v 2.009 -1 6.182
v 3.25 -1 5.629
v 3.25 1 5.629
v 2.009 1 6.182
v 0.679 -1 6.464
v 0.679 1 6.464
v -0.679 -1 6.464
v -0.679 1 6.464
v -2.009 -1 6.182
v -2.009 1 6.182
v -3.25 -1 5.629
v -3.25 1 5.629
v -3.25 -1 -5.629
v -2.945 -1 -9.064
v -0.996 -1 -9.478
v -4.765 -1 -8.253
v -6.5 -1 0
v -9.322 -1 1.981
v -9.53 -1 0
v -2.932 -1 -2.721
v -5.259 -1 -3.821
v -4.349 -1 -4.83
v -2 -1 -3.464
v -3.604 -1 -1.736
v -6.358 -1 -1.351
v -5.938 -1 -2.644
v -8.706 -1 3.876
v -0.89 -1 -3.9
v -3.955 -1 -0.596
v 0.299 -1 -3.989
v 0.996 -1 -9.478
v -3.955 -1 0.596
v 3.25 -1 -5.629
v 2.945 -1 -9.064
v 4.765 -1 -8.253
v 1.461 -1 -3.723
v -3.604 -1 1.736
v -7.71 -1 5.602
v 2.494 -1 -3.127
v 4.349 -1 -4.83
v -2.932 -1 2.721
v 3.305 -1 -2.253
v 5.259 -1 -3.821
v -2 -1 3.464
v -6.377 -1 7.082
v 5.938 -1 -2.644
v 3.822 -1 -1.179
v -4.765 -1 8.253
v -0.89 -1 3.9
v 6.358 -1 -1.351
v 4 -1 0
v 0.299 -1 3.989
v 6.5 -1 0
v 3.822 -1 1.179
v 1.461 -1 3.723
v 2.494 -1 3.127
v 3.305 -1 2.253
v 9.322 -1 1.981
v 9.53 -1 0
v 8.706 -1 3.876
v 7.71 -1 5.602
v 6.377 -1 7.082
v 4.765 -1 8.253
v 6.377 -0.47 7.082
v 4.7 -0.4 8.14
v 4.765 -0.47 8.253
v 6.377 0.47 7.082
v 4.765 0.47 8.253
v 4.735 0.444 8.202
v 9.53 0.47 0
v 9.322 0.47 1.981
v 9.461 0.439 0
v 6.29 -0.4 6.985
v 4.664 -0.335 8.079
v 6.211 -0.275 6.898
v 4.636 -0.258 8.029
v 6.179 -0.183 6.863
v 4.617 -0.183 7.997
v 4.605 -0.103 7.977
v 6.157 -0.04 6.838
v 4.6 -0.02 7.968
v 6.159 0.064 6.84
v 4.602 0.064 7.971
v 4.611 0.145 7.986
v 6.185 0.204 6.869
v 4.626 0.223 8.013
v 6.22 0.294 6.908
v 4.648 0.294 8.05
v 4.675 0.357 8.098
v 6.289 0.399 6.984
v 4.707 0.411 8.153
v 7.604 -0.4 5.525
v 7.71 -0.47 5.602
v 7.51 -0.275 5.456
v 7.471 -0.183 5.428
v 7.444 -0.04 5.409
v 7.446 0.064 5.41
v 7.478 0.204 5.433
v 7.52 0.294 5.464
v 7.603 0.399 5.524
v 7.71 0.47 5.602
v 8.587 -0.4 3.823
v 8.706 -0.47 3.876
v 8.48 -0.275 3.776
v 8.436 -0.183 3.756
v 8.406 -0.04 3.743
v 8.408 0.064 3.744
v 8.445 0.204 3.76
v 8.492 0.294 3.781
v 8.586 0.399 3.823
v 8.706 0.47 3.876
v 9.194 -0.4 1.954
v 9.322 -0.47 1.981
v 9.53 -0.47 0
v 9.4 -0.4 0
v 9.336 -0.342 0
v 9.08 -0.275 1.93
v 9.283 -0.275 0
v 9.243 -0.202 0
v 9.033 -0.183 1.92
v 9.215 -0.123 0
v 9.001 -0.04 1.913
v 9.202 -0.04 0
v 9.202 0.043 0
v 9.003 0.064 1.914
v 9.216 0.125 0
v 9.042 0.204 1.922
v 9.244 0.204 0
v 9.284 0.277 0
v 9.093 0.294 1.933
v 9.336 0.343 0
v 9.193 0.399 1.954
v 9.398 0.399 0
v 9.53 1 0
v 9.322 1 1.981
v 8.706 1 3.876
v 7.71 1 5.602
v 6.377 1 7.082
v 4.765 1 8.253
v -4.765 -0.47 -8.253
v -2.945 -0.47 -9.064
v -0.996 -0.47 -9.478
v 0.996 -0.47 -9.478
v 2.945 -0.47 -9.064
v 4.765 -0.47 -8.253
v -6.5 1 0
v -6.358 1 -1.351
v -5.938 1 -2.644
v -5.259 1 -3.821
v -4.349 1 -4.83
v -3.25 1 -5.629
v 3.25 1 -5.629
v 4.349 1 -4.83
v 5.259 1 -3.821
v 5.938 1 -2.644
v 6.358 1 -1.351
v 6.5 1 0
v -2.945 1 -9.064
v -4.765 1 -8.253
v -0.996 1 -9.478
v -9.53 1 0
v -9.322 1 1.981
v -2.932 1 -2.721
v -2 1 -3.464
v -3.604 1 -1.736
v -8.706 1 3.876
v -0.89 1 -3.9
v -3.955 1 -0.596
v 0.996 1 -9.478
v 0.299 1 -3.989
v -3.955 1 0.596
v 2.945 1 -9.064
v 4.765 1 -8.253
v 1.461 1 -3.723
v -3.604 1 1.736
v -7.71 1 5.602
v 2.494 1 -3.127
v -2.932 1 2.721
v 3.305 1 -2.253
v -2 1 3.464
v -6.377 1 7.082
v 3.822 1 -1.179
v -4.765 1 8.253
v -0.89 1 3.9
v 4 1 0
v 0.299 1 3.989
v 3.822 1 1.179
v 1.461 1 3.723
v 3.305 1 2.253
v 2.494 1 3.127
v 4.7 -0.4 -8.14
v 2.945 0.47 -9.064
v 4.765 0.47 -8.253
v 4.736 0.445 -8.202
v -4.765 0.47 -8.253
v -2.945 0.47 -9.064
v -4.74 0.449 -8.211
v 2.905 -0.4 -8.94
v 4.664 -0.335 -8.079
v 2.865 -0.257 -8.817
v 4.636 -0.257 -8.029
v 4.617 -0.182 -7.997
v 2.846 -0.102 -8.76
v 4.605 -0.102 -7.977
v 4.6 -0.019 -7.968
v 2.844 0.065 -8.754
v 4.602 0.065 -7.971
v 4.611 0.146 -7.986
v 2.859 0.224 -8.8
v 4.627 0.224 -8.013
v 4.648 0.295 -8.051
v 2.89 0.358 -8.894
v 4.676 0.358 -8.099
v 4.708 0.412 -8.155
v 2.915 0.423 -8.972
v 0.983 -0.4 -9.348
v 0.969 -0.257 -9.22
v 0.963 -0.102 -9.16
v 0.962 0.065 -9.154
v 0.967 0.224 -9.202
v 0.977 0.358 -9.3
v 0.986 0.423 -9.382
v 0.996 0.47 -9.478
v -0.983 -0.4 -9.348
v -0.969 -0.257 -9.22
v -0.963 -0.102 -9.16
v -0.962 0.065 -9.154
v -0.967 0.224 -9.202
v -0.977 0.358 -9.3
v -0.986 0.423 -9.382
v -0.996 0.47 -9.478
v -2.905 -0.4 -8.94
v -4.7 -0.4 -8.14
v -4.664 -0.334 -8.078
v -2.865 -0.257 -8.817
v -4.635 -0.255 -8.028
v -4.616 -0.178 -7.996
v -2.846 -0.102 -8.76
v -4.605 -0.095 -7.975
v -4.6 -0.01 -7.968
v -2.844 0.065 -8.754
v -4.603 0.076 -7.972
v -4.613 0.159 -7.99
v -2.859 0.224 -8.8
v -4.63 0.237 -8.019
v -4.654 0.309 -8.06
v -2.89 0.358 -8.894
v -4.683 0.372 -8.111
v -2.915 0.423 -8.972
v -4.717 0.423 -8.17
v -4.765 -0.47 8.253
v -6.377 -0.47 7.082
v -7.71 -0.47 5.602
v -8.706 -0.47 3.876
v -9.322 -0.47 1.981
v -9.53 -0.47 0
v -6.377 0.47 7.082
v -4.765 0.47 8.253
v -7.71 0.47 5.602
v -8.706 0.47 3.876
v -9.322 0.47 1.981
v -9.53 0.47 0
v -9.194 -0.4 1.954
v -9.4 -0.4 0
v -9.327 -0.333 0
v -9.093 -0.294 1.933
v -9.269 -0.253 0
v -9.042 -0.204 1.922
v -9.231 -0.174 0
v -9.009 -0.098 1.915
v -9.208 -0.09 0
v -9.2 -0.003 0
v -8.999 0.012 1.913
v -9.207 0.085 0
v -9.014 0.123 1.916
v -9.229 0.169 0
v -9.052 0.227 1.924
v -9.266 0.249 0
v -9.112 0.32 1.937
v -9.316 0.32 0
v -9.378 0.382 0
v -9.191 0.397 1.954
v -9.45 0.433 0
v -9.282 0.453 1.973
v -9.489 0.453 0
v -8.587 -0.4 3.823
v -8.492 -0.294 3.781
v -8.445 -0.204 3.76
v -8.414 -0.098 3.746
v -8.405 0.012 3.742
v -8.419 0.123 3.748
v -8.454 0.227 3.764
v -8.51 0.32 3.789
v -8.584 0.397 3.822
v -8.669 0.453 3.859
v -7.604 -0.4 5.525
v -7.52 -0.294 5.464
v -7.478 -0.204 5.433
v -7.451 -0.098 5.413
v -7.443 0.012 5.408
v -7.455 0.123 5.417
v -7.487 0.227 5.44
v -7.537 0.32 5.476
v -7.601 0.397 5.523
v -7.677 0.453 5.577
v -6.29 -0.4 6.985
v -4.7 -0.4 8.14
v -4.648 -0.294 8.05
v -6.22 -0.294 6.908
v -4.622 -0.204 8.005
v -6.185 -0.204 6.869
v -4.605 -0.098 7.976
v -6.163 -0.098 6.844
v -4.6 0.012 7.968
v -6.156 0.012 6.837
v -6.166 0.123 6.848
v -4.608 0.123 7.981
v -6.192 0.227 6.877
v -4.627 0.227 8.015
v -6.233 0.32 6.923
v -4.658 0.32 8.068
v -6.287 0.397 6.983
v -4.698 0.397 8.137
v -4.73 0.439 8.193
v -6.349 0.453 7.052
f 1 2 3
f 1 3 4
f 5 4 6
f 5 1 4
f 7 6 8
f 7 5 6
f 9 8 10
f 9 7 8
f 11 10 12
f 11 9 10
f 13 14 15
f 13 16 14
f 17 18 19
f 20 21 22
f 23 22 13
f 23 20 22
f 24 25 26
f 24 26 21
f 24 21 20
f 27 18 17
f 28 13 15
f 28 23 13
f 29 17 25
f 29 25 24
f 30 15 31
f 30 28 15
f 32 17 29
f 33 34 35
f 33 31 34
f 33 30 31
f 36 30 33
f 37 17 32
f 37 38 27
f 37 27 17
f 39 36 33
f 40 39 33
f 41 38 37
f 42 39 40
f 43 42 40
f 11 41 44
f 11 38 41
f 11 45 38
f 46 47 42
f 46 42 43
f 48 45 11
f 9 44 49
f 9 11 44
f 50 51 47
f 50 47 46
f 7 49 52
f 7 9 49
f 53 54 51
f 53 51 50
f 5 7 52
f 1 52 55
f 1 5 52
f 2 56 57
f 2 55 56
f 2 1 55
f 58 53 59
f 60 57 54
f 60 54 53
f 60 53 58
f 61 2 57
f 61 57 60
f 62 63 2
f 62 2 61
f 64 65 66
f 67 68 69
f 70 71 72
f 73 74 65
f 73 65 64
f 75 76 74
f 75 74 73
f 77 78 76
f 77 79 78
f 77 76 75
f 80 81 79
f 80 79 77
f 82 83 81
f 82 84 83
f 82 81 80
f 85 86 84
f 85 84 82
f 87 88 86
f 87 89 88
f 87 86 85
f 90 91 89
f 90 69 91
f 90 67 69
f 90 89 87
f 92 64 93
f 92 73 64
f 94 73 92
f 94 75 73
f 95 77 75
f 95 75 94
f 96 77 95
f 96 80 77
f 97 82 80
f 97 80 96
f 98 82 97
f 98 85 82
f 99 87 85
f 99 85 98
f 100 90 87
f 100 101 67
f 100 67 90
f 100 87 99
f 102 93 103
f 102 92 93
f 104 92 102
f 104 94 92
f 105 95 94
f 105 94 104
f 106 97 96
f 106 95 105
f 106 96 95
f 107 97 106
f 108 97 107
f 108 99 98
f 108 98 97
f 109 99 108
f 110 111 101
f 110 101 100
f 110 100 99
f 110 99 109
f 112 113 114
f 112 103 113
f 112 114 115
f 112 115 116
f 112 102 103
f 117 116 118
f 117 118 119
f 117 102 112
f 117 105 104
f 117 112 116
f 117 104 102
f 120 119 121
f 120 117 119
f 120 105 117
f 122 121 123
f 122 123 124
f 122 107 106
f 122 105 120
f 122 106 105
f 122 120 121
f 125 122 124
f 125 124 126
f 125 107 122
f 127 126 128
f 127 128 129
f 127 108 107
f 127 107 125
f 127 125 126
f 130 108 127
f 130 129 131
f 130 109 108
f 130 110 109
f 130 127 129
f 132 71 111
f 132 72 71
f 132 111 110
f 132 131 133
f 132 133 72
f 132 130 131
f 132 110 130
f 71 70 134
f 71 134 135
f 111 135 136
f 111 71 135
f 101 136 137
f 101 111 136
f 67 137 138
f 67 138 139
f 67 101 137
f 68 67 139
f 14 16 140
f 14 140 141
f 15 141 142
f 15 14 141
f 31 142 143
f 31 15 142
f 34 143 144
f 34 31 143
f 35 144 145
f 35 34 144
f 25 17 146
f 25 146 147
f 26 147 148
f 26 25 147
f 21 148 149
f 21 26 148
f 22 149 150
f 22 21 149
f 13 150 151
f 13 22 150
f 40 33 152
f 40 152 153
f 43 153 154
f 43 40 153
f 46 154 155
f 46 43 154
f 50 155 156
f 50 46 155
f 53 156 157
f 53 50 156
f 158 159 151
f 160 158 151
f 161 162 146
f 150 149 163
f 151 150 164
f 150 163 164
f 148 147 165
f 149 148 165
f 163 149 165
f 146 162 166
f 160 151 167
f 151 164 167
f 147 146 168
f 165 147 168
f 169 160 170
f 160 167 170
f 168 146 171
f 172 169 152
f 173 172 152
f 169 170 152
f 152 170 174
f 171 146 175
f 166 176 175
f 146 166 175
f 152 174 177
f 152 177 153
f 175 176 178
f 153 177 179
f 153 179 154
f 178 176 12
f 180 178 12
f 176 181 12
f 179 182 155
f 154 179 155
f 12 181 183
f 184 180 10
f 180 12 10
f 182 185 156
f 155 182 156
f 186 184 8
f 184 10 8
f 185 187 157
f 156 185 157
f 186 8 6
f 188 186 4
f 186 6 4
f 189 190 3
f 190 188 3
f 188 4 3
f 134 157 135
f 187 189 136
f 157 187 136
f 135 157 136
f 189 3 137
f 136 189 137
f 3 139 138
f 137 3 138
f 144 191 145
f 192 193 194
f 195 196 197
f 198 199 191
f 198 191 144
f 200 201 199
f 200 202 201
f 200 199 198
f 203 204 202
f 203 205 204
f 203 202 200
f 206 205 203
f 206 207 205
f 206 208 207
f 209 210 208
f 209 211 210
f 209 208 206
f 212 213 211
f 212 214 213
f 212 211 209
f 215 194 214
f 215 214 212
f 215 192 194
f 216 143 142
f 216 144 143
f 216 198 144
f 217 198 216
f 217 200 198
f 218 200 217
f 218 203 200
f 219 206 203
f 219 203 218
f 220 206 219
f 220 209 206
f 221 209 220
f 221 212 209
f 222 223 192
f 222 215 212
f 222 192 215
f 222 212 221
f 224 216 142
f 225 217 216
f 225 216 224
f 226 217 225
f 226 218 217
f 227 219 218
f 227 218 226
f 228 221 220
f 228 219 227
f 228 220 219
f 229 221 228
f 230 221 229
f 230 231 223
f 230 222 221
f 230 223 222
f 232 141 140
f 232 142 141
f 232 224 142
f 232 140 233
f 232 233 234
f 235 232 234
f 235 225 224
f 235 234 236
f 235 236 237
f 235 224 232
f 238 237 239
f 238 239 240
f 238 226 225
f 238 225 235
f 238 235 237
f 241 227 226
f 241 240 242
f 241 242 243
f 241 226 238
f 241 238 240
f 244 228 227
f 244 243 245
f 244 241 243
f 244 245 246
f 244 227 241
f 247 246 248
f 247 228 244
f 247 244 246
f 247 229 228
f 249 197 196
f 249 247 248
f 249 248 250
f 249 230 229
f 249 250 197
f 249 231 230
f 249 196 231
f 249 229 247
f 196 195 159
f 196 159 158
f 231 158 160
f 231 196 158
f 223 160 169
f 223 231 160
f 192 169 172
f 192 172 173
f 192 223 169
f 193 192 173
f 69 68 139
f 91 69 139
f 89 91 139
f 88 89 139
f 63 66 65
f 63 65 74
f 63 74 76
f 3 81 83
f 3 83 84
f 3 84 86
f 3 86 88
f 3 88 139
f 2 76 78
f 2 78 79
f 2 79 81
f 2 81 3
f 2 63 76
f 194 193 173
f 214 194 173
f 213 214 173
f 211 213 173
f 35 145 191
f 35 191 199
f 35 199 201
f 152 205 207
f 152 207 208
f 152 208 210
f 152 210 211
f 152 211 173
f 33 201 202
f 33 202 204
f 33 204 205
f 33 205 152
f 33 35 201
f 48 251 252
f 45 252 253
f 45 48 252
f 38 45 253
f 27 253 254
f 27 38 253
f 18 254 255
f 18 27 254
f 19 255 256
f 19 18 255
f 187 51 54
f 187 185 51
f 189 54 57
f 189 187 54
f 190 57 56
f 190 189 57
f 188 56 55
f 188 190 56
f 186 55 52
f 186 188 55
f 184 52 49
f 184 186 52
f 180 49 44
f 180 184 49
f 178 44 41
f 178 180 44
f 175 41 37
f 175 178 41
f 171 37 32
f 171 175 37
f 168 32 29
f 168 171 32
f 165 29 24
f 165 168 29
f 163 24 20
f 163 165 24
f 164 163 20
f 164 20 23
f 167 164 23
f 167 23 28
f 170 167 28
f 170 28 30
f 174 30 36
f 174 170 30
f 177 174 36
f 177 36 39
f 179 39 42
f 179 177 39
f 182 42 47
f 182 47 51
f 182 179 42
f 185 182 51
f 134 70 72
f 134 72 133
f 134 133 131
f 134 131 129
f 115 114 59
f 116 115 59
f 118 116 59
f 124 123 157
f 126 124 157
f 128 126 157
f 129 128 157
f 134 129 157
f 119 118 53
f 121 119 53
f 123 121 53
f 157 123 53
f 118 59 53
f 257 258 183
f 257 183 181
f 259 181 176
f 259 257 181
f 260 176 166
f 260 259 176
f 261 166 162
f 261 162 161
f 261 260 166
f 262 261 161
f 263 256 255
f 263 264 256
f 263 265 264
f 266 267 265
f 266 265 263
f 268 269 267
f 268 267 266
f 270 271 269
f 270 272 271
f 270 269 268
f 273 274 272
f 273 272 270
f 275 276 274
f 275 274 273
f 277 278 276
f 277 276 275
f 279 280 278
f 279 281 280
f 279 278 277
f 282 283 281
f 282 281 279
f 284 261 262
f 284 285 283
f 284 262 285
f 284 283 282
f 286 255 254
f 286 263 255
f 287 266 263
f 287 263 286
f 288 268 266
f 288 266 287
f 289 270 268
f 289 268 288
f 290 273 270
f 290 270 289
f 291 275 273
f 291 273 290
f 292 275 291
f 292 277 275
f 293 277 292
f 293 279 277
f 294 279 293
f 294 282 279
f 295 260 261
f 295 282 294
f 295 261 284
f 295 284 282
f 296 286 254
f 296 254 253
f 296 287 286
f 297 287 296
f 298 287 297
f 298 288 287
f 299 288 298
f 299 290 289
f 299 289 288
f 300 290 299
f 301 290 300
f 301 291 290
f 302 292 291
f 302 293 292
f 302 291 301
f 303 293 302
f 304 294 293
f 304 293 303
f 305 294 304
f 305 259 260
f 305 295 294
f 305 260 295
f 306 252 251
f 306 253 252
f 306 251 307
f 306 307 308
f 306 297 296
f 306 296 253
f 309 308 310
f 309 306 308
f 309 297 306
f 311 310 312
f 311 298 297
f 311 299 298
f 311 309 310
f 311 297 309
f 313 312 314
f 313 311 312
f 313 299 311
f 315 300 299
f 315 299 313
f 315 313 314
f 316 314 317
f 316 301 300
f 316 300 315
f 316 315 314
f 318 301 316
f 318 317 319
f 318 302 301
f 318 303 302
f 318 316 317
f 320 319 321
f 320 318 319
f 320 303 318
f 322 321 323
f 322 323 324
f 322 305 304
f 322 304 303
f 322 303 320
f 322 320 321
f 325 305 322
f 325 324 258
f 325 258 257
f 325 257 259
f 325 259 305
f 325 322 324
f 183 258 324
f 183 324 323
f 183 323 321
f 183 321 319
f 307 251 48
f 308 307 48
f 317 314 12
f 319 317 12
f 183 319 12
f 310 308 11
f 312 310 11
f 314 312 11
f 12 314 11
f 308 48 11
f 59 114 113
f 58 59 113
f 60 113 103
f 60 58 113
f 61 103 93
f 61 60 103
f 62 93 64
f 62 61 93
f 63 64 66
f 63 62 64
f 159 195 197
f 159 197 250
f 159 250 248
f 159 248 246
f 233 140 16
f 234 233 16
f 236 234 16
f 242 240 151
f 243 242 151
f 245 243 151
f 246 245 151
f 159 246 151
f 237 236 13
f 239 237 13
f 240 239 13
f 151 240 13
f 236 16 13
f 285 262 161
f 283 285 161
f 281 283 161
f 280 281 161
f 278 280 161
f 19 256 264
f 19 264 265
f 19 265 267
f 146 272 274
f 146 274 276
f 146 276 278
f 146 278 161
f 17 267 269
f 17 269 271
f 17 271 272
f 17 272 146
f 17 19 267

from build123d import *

# Parameters (mm, degrees)
SKETCH005_R          = 9.53
SKETCH005_R_2        = 4
PAD001_DEPTH         = 1
POCKET001_DEPTH      = 55.059013
POCKET001_DEPTH_BACK = 55.059013
POLARPATTERN_COUNT   = 3
SKETCH007_R          = 0.5


with BuildPart() as part:
    # Sketch005 → Pad001 (new body, symmetric)
    with BuildSketch(Plane.XZ):
        Circle(SKETCH005_R)
        Circle(SKETCH005_R_2, mode=Mode.SUBTRACT)
    extrude(amount=PAD001_DEPTH, both=True)

    # Sketch006 → Pocket001 (cut, two sides)
    with BuildSketch(Plane.XZ) as pocket001_sk:
        with BuildLine():
            ThreePointArc((4.765, 8.253222), (0, 9.53), (-4.765, 8.253222))
            Line((-4.765, 8.253222), (-3.25, 5.629165))
            ThreePointArc((3.25, 5.629165), (0, 6.5), (-3.25, 5.629165))
            Line((4.765, 8.253222), (3.25, 5.629165))
        make_face()
    pocket001 = extrude(amount=-POCKET001_DEPTH, mode=Mode.SUBTRACT) + extrude(pocket001_sk.sketch, amount=POCKET001_DEPTH_BACK, mode=Mode.SUBTRACT)

    # PolarPattern: Pocket001 ×3 about axis
    polarpattern_axis = Axis((0, 0, 0), (0, -1, 0))
    for i in range(1, POLARPATTERN_COUNT):
        add(pocket001.rotate(polarpattern_axis, i * 360 / POLARPATTERN_COUNT), mode=Mode.SUBTRACT)

    # Sketch007 → Groove001 (revolve, cut)
    with BuildSketch(Plane.YZ):
        with Locations((0, 9.7)):
            Circle(SKETCH007_R)
    revolve(axis=Axis((0, 0, 0), (0, 1, 0)), mode=Mode.SUBTRACT)


solid = part.part
